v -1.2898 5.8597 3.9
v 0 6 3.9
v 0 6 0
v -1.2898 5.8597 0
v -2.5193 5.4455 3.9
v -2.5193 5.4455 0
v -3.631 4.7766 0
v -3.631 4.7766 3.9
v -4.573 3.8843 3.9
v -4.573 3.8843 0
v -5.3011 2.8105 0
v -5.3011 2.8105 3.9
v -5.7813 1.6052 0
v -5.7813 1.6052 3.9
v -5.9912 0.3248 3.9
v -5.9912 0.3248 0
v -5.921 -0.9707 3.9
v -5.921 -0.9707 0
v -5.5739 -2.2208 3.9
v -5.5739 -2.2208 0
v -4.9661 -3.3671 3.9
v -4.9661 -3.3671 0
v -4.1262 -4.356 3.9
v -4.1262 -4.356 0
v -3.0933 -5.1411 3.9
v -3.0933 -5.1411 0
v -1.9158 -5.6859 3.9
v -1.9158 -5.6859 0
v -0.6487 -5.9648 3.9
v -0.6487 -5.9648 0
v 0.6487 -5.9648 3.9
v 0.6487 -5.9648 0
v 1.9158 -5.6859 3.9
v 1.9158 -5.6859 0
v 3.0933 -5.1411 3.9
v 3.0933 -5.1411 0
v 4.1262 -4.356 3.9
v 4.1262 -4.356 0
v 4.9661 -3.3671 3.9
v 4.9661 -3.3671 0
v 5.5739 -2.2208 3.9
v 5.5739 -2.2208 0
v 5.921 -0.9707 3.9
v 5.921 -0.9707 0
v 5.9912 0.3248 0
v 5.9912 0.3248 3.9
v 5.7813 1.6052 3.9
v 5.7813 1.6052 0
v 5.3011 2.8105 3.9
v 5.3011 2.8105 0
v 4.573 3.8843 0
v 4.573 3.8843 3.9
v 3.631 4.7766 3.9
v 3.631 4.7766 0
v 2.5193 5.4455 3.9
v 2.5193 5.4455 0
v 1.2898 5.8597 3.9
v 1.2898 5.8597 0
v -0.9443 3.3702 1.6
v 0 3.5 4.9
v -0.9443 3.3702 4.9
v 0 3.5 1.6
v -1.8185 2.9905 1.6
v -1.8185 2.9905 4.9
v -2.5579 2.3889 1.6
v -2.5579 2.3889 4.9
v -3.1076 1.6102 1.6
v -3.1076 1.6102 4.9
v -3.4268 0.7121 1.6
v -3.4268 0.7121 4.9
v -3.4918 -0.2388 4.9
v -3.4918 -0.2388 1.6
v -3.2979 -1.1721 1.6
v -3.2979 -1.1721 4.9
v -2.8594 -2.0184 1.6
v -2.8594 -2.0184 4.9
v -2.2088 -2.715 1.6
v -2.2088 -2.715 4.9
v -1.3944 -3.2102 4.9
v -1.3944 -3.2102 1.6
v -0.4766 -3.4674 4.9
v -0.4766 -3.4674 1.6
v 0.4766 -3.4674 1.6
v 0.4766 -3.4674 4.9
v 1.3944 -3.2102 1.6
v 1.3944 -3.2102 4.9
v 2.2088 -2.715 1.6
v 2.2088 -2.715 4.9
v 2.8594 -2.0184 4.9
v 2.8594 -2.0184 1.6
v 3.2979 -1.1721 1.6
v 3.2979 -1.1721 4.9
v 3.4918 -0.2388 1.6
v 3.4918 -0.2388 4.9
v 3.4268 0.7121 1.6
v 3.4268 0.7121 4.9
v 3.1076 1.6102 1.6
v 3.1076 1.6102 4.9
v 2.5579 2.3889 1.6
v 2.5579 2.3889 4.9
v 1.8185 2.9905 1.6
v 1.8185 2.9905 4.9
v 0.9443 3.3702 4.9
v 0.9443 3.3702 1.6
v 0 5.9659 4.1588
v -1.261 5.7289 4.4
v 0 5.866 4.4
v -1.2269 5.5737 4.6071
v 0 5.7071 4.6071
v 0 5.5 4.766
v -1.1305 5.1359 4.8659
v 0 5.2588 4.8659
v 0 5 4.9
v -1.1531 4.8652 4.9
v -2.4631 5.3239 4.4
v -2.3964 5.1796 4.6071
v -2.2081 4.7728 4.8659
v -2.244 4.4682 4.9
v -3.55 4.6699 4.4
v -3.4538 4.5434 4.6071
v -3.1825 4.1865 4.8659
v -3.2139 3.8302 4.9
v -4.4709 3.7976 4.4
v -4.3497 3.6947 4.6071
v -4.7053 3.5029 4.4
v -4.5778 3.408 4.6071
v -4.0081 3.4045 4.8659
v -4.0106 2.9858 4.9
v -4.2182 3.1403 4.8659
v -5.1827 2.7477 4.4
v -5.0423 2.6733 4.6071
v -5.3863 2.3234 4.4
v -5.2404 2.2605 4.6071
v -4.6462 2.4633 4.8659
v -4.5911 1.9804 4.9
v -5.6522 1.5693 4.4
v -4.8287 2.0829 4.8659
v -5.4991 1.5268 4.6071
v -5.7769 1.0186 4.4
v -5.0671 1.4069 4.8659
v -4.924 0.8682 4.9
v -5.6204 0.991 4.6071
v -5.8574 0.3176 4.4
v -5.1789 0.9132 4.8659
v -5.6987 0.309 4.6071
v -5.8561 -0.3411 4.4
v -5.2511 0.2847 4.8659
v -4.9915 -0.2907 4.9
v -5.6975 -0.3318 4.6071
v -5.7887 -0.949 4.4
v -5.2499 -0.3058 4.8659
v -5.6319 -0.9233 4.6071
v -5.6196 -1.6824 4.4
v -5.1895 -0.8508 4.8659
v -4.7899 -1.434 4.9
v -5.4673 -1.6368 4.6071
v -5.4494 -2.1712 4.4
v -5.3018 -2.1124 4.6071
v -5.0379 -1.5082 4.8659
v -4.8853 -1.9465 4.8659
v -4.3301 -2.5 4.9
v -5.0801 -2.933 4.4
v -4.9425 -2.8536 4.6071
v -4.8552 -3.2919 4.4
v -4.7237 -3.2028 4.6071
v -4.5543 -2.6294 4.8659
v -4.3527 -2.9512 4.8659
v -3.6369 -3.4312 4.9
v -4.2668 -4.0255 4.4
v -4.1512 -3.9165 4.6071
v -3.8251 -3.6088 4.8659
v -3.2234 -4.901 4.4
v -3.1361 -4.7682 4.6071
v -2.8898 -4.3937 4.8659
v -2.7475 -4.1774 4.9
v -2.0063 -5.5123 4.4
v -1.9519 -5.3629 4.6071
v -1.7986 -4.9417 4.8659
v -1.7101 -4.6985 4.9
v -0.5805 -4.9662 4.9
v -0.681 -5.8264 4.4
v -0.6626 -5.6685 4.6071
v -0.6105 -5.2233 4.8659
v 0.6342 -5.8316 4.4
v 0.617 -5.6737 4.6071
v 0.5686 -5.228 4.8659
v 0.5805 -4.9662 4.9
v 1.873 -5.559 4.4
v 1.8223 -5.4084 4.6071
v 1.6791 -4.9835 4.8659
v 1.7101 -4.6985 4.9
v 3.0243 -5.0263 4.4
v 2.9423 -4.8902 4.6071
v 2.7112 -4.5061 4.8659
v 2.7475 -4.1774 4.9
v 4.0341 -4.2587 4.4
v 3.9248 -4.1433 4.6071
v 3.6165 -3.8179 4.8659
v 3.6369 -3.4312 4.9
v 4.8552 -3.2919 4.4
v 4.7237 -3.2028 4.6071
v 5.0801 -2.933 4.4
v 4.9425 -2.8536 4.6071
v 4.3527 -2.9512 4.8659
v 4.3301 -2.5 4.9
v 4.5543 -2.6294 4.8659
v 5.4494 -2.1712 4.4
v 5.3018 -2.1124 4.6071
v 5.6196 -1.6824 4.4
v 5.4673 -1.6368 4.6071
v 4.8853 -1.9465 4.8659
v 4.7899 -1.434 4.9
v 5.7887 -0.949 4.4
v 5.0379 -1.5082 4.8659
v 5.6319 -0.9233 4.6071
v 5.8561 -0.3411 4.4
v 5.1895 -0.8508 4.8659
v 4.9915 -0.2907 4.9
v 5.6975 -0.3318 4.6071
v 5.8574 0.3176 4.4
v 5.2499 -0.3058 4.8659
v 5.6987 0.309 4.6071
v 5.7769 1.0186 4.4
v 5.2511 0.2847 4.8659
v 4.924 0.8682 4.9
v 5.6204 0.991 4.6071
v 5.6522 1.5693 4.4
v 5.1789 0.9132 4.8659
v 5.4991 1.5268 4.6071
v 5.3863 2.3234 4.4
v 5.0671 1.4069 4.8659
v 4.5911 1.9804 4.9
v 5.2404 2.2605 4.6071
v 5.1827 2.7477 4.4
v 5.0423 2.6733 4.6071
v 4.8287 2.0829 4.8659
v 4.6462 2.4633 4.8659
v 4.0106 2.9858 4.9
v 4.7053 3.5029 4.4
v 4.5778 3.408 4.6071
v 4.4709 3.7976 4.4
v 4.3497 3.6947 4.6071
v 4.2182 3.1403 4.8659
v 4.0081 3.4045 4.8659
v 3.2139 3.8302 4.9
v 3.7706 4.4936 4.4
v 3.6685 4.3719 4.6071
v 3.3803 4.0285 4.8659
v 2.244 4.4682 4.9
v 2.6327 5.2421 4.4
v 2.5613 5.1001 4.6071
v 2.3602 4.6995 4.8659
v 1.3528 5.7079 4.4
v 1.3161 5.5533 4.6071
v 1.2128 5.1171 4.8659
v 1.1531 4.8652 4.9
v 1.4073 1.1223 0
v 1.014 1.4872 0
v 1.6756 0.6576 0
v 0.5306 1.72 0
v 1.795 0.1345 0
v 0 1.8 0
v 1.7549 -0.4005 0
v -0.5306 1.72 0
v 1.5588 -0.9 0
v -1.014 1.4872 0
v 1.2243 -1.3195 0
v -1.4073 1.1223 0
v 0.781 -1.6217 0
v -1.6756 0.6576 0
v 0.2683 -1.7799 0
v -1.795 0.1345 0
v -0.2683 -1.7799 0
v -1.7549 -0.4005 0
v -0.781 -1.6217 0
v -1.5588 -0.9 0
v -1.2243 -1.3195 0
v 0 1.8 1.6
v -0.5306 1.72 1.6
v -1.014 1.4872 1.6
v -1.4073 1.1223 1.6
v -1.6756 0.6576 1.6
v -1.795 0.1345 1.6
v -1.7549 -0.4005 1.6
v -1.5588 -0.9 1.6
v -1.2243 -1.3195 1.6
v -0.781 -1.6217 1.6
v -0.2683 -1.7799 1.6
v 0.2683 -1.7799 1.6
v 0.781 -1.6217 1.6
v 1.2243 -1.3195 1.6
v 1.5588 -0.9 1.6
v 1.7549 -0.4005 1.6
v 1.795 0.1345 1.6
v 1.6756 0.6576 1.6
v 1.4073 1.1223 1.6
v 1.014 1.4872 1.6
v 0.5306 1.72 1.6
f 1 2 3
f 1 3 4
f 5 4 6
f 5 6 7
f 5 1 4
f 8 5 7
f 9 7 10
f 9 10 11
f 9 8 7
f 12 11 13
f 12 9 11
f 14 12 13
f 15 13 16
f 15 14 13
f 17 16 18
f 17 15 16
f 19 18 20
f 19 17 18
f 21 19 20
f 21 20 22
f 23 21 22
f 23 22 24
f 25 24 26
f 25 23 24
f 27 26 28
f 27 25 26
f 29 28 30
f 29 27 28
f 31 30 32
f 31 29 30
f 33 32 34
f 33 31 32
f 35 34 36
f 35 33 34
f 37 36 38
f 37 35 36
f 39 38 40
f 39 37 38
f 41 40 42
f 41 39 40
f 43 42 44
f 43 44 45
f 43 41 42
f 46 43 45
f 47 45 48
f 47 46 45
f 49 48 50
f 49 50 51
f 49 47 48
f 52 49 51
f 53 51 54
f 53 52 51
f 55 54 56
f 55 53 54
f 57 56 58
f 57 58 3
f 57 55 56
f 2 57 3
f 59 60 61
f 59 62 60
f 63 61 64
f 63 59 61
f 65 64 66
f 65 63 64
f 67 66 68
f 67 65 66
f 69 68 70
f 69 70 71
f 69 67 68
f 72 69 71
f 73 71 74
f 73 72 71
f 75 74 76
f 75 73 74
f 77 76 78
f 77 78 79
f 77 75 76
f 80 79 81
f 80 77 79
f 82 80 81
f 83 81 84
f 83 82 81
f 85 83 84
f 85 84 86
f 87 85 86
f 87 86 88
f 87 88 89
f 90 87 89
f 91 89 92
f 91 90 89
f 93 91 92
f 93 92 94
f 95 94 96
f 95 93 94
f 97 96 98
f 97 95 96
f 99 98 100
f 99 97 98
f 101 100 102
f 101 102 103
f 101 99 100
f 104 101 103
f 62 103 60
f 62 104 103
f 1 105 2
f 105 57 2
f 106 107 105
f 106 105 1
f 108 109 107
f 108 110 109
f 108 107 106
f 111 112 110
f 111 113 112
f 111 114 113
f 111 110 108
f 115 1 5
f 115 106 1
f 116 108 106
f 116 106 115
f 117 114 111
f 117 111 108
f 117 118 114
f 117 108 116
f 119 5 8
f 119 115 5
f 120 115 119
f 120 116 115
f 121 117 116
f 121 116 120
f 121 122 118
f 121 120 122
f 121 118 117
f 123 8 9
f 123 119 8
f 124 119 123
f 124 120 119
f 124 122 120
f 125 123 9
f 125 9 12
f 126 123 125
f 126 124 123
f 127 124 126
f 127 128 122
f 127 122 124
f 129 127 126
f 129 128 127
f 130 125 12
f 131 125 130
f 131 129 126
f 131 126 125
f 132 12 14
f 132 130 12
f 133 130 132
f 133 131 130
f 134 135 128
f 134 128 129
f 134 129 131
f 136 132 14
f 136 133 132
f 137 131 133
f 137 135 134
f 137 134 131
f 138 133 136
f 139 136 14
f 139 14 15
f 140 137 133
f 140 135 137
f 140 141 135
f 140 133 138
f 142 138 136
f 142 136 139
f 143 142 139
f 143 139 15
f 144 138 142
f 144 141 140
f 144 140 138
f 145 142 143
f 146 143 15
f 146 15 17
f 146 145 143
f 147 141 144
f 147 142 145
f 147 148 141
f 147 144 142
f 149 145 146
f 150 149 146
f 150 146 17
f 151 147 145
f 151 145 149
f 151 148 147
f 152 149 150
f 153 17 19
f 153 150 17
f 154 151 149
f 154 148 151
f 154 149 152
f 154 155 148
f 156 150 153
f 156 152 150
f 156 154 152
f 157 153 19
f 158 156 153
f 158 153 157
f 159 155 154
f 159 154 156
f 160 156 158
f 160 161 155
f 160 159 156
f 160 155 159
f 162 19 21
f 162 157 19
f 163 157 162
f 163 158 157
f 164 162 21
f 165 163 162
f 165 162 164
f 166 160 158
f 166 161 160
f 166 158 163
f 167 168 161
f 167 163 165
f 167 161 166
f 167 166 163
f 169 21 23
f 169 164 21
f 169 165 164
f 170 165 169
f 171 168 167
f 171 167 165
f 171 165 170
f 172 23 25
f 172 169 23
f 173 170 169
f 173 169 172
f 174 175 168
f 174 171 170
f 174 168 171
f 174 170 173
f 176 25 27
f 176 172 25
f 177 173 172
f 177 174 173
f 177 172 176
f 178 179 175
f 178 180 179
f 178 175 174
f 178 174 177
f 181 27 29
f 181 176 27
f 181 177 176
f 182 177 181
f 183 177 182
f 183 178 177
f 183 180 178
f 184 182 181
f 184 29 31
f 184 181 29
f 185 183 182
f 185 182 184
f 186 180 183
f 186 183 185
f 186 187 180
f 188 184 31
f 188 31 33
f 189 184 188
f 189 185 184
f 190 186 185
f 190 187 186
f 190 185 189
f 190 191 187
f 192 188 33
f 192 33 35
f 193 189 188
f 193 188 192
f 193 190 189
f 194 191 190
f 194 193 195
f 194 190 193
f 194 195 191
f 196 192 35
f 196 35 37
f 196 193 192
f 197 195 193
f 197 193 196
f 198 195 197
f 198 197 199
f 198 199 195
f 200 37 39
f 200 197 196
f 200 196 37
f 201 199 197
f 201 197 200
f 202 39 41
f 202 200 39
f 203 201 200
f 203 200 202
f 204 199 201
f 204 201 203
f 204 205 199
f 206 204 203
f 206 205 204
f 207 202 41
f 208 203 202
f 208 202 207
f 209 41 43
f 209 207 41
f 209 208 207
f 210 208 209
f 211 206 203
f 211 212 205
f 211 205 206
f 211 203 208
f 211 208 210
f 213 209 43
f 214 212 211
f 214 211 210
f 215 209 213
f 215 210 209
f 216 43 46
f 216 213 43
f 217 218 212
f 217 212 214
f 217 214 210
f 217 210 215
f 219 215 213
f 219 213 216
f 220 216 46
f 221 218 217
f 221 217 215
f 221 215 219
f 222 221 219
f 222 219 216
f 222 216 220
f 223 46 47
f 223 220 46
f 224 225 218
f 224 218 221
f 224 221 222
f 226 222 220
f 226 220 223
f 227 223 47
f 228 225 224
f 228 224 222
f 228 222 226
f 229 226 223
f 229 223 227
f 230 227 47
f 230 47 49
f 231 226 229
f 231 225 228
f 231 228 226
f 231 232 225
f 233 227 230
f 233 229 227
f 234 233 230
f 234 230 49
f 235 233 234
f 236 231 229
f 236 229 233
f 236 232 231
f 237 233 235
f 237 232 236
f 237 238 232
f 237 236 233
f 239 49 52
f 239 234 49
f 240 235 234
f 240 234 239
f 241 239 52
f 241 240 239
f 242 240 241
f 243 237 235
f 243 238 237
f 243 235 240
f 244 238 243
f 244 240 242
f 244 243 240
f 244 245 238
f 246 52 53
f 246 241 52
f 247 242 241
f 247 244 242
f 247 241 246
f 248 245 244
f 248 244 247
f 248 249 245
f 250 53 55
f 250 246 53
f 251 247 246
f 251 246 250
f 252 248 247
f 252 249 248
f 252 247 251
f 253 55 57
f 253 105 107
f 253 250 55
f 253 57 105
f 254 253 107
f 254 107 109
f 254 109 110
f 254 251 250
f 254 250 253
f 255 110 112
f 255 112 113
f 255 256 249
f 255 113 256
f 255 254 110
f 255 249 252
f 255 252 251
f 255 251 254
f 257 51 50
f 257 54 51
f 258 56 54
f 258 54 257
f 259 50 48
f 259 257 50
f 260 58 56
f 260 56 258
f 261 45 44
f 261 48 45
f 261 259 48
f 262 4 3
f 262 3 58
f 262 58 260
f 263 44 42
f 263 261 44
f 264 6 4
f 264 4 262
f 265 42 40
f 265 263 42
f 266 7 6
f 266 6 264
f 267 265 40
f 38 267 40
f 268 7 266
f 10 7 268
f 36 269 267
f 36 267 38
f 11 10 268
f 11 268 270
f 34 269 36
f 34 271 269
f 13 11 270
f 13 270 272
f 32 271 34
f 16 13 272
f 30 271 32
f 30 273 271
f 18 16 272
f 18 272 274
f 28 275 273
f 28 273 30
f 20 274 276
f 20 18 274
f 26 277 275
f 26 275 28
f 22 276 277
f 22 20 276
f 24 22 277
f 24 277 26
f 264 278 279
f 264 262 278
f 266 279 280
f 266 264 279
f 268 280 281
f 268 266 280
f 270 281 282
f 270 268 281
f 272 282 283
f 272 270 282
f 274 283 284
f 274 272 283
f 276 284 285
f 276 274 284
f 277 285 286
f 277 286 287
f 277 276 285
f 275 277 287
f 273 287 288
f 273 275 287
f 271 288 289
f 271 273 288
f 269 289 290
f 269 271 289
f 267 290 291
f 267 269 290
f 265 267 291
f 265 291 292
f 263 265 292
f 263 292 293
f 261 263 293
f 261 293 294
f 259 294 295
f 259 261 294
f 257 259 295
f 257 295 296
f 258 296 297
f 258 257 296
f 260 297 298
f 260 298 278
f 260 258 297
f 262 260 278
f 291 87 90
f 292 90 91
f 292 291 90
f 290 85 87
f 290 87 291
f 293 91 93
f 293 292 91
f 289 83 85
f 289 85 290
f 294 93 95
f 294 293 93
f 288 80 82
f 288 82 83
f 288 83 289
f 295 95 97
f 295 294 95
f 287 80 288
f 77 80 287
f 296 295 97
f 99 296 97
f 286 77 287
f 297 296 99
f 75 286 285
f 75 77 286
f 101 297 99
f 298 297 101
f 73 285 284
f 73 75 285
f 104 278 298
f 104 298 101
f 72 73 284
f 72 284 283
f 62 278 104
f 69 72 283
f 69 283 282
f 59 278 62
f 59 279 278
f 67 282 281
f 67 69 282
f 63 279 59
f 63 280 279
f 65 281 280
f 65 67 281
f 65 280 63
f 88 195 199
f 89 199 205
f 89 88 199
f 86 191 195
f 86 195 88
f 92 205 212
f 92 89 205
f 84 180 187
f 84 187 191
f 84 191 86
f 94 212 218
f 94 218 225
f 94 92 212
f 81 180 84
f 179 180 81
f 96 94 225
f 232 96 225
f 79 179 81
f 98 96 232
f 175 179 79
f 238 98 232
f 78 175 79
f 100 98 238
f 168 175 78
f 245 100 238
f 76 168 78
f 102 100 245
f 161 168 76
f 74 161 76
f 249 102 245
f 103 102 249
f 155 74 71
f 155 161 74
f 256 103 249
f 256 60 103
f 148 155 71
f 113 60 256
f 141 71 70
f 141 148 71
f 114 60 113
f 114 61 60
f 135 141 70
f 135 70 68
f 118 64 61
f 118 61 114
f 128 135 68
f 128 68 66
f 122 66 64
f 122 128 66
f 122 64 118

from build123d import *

# Parameters (mm, degrees)
REDONDEO1_R = 1


with BuildPart() as part:
    # Croquis1 → Revolución1 (revolve)
    with BuildSketch(Plane(origin=(0, 0, 0), x_dir=(0, 0, -1), z_dir=(1, 0, 0))):
        Polygon((0, 1.8), (0, 6), (-4.9, 6), (-4.9, 3.5), (-1.6, 3.5), (-1.6, 1.8), align=None)
    revolve(axis=Axis((0, 0, 0), (0, 0, 1)))

    # Redondeo1
    redondeo1_edges = [part.edges().sort_by_distance(p)[0] for p in [
        (0, -6, 4.9),
    ]]
    fillet(redondeo1_edges, radius=REDONDEO1_R)


solid = part.part
